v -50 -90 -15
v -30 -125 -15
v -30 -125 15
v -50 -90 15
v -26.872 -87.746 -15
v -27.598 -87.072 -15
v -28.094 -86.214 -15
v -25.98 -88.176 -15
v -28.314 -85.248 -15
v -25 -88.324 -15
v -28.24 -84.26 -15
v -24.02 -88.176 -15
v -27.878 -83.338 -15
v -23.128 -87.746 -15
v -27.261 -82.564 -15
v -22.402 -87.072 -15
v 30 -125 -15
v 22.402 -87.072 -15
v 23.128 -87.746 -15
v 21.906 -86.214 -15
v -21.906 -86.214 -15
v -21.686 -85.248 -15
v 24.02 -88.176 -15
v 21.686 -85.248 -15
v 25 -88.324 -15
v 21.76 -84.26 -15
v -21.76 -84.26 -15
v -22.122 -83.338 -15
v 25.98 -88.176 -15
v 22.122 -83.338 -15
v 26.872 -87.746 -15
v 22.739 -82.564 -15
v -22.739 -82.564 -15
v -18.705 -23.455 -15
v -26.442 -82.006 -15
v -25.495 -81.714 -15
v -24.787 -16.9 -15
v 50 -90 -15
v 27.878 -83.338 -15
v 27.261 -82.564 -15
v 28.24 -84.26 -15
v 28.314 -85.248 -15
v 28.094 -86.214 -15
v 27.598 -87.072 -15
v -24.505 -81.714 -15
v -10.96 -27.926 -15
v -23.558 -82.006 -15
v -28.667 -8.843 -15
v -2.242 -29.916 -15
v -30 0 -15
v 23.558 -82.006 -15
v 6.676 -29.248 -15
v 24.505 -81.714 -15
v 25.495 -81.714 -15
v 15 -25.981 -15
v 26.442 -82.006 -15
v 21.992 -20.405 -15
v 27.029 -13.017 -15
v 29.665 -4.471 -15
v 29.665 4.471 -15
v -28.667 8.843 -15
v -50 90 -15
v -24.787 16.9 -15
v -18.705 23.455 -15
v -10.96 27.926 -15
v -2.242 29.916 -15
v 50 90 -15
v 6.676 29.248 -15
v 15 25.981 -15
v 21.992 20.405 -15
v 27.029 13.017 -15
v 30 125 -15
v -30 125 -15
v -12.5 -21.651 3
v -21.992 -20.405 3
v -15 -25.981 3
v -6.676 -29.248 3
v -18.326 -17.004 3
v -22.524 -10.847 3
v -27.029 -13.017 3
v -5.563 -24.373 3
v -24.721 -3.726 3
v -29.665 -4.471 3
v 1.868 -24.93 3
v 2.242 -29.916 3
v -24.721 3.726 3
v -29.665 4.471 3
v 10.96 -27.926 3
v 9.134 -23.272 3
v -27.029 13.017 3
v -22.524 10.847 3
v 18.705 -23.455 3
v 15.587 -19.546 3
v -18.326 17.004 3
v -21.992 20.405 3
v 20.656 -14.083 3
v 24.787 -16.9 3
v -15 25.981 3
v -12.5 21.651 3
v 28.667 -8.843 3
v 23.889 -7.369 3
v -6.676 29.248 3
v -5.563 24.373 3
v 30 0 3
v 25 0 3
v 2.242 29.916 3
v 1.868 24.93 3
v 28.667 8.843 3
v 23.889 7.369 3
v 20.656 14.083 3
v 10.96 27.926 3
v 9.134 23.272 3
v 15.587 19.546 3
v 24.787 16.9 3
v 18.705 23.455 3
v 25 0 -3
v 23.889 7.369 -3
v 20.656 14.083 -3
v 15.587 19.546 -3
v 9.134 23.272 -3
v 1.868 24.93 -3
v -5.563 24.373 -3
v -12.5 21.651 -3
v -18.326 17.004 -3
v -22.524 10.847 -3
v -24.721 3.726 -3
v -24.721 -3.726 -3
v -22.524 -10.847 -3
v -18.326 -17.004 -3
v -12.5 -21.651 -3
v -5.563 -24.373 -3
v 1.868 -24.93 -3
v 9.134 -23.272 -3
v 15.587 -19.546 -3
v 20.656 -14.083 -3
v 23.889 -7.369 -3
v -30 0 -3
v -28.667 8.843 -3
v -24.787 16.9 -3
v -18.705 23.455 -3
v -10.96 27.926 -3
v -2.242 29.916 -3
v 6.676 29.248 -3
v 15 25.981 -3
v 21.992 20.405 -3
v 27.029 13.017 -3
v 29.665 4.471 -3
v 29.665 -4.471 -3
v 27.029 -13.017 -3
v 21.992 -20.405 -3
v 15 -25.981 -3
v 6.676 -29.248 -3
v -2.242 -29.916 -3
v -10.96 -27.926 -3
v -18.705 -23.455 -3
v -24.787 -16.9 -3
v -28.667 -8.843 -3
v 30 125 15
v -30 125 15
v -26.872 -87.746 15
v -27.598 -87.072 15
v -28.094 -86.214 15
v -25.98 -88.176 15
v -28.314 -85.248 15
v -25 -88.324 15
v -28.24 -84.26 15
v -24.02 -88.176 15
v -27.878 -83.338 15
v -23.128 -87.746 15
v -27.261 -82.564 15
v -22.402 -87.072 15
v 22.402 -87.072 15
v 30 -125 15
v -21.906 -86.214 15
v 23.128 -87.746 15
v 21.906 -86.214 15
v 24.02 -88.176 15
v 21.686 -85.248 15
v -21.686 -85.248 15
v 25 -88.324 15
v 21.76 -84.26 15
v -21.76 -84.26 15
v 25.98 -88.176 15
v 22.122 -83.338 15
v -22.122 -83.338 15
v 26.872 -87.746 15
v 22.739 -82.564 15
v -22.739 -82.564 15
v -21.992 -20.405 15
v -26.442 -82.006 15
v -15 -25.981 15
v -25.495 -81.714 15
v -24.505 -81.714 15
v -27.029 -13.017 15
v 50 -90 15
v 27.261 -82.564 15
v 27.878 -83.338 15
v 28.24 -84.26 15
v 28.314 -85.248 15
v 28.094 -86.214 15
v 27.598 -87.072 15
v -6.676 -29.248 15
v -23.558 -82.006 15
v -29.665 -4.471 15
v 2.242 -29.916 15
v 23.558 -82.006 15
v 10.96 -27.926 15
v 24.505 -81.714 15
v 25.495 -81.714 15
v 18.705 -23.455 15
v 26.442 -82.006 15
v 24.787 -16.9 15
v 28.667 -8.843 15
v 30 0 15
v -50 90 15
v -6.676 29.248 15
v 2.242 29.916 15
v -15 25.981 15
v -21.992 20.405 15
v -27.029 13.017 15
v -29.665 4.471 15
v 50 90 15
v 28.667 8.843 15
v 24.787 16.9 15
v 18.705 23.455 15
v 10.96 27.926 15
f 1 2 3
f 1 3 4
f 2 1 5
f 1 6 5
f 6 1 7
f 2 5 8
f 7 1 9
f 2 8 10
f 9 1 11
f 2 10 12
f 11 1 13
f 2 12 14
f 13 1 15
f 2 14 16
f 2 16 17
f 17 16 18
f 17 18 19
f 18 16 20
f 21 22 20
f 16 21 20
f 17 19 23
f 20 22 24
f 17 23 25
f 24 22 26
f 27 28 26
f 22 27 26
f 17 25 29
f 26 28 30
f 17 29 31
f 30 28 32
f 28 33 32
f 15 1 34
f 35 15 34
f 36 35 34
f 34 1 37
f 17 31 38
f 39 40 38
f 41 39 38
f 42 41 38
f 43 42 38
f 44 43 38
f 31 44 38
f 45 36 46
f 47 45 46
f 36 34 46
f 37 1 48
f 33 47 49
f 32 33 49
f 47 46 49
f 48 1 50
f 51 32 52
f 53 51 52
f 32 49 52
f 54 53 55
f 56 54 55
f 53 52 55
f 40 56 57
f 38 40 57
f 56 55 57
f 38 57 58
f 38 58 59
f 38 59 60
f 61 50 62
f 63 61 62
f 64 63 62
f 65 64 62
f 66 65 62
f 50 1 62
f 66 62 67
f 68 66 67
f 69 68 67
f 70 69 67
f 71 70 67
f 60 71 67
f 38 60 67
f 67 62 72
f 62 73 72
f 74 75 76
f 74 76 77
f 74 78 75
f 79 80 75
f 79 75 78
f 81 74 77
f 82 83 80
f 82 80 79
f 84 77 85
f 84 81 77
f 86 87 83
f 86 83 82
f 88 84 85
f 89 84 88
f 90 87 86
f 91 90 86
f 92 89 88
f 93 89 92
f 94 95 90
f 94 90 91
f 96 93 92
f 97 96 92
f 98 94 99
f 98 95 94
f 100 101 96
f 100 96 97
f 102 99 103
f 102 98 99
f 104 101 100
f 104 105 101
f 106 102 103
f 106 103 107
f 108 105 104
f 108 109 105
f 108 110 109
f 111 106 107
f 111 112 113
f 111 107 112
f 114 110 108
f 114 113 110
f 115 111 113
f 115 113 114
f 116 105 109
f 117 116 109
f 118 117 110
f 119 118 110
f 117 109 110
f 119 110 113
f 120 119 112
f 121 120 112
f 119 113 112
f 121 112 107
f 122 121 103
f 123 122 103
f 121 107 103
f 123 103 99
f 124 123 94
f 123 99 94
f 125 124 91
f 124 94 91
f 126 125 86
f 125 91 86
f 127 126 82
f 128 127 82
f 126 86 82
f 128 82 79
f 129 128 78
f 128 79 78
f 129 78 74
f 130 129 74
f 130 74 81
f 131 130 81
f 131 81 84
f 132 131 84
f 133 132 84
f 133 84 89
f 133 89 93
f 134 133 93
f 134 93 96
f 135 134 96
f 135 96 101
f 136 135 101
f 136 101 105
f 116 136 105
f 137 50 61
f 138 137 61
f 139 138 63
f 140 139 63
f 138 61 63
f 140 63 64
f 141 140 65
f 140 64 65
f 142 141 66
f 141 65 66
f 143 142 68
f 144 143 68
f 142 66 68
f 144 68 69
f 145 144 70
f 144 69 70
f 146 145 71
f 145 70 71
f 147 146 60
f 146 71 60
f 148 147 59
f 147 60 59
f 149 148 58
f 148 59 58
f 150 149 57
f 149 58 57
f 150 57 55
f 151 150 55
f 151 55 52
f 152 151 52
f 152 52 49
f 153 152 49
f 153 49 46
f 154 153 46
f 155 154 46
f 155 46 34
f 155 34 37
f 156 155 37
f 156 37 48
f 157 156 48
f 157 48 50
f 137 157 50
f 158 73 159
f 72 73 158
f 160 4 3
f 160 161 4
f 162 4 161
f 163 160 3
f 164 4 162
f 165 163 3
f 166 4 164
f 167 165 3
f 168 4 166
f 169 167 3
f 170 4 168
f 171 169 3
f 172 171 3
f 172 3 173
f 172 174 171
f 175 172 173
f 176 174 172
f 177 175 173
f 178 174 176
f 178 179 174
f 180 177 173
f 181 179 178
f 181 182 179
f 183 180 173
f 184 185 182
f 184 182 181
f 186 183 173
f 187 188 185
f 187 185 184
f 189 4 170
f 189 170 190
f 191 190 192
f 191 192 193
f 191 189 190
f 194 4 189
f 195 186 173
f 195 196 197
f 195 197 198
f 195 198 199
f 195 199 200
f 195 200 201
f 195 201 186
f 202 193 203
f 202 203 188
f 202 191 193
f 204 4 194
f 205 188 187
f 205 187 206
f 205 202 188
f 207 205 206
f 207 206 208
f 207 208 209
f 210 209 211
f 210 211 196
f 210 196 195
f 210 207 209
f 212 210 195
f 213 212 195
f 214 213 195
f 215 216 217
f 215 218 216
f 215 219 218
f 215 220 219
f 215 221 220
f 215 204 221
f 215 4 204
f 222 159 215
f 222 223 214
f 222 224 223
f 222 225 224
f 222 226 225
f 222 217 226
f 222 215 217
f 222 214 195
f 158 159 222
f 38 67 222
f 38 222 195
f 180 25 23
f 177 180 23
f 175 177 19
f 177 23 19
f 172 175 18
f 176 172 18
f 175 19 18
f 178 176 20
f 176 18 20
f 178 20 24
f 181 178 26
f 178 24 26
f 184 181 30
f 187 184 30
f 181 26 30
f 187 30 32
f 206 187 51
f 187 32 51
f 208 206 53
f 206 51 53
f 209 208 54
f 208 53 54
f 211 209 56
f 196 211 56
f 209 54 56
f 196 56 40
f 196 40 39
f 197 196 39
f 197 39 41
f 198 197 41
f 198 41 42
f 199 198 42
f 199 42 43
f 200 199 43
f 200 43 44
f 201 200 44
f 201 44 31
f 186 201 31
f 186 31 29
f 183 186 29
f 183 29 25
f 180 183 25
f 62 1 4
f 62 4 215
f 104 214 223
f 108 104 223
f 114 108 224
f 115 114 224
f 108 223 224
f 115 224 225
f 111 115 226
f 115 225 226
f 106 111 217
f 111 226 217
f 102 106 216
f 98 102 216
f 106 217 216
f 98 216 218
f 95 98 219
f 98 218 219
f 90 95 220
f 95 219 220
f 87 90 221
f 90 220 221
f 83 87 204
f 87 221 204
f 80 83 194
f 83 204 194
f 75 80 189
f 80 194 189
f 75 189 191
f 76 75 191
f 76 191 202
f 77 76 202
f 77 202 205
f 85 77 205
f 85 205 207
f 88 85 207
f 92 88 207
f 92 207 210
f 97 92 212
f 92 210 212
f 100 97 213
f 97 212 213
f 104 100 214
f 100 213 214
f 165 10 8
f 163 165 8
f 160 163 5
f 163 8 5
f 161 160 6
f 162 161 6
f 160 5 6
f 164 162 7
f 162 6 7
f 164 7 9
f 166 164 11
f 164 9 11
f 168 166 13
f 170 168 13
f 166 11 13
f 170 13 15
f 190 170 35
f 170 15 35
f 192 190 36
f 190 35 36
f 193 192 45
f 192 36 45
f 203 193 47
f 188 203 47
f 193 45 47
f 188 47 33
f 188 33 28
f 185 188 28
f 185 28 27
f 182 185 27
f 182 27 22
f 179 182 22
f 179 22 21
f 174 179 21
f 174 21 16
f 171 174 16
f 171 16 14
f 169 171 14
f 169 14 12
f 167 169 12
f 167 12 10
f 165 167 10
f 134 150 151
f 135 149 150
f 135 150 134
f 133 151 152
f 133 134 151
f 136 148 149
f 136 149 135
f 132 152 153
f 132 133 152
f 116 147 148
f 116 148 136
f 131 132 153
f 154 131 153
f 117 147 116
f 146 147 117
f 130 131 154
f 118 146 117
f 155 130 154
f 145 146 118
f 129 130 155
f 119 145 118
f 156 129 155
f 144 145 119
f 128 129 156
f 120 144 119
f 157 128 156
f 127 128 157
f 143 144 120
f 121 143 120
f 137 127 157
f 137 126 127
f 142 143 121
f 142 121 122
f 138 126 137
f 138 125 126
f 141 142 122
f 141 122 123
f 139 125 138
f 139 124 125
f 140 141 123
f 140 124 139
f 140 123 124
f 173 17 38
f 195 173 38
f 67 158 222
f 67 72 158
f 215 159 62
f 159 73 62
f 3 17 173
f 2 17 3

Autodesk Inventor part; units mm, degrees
ref_plane "YZ Plane" through (0, 0, 0) normal (1, 0, 0) x (0, 1, 0)
ref_plane "XY Plane" through (0, 0, 0) normal (0, 0, 1) x (1, 0, 0)
ref_plane "Upper Pickup Plane" through (0, 110, 0) normal (0, 1, 0) x (-1, 0, 0)
ref_plane "Lower Pickup Plane" through (0, -110, 0) normal (0, 1, 0) x (-1, 0, 0)
sketch "Sketch1" plane through (0, 0, 0) normal (0, 0, 1) x (1, 0, 0)
  line L0 (-70, 0) -> (70, 0) construction
  line L1 (0, 175) -> (0, -175) construction
  line L2 (30, -125) -> (-30, -125)
  line L3 (-50, -90) -> (-50, 90)
  line L4 (-30, 125) -> (30, 125)
  line L5 (50, 90) -> (50, -90)
  line L6 (-30, 125) -> (-50, 90)
  line L7 (30, 125) -> (50, 90)
  line L8 (-50, 90) -> (50, 90) construction
  line L9 (-30, -125) -> (-50, -90)
  line L10 (30, -125) -> (50, -90)
  line L11 (-50, -90) -> (50, -90) construction
  line L12 (-50, 90) -> (-50, 125) construction
  line L13 (50, 90) -> (50, 125) construction
  line L14 (-30, 125) -> (-50, 125) construction
  line L15 (30, 125) -> (50, 125) construction
  line L16 (-50, -90) -> (-50, -125) construction
  line L17 (-30, -125) -> (-50, -125) construction
  line L18 (30, -125) -> (50, -125) construction
  line L19 (50, -90) -> (50, -125) construction
  point P0 (0, 0)
  point P1 (0, 110)
  point P2 (0, -110)
  dimension "d8" = 180
  dimension "d9" = 60
  dimension "d11" = 250
  dimension "d12" = 100
extrude "Main Body" add sketch "Sketch1" along normal mid plane 30
sketch "Sketch2" plane through (0, 0, 15) normal (0, 0, 1) x (1, 0, 0)
  circle A0 centre (0, 0) radius 25
  dimension "d13" = 50
extrude "Axle Bore" cut sketch "Sketch2" against normal through all
sketch "Sketch3" plane through (0, 0, 15) normal (0, 0, 1) x (1, 0, 0)
  circle A0 centre (0, 0) radius 30
  circle A1 centre (0, 0) radius 25 projected
  dimension "d16" = 60
extrude "Front Side Bearing Pocket" cut sketch "Sketch3" against normal blind 12
sketch "Sketch4" plane through (0, 0, -15) normal (0, 0, -1) x (-1, 0, 0)
  circle A0 centre (0, 0) radius 30 projected
  circle A1 centre (0, 0) radius 25 projected
extrude "Back Side Bearing Pocket" cut sketch "Sketch4" against normal blind 12
sketch "Sketch5" plane through (0, 0, 15) normal (0, 0, 1) x (1, 0, 0)
  line L0 (-50, 90) -> (-50, -90) projected
  line L1 (-50, -85) -> (50, -85) construction
  line L2 (50, -90) -> (50, 90) projected
  line L3 (0, 175) -> (0, -175) construction
  point P0 (0, 0)
  point P1 (0, -110)
  point P2 (-25, -85)
  point P3 (25, -85)
  dimension "d23" = 25
  dimension "d24" = 50
hole "Hole1" at (-25, -85, 15) at (25, -85, 15) direction (0, 0, -1) diameter 6.647 depth 30 thread size "M8x1.25" class "6H" standard "ANSI Metric M Profile"
equation "\"d4\" = Upright_Thickness"
equation "\"d13\" = Axle_Bore_Diameter"
equation "\"d16\" = Wheel_Bearing_Bore_Diameter"
equation "\"d17\" = Wheel_Bearing_Thickness"
equation "\"d19\" = Wheel_Bearing_Thickness"
equation "\"d23\" = arm_z"
equation "\"d26\" = Upright_Thickness"
equation "\"Upright_Thickness\" = 30"
equation "\"Axle_Bore_Diameter\" = 50"
equation "\"Wheel_Bearing_Bore_Diameter\" = 60"
equation "\"Wheel_Bearing_Thickness\" = 12"
equation "\"arm_z\" = 25"
properties part number "Suspension_Upright_V2"
